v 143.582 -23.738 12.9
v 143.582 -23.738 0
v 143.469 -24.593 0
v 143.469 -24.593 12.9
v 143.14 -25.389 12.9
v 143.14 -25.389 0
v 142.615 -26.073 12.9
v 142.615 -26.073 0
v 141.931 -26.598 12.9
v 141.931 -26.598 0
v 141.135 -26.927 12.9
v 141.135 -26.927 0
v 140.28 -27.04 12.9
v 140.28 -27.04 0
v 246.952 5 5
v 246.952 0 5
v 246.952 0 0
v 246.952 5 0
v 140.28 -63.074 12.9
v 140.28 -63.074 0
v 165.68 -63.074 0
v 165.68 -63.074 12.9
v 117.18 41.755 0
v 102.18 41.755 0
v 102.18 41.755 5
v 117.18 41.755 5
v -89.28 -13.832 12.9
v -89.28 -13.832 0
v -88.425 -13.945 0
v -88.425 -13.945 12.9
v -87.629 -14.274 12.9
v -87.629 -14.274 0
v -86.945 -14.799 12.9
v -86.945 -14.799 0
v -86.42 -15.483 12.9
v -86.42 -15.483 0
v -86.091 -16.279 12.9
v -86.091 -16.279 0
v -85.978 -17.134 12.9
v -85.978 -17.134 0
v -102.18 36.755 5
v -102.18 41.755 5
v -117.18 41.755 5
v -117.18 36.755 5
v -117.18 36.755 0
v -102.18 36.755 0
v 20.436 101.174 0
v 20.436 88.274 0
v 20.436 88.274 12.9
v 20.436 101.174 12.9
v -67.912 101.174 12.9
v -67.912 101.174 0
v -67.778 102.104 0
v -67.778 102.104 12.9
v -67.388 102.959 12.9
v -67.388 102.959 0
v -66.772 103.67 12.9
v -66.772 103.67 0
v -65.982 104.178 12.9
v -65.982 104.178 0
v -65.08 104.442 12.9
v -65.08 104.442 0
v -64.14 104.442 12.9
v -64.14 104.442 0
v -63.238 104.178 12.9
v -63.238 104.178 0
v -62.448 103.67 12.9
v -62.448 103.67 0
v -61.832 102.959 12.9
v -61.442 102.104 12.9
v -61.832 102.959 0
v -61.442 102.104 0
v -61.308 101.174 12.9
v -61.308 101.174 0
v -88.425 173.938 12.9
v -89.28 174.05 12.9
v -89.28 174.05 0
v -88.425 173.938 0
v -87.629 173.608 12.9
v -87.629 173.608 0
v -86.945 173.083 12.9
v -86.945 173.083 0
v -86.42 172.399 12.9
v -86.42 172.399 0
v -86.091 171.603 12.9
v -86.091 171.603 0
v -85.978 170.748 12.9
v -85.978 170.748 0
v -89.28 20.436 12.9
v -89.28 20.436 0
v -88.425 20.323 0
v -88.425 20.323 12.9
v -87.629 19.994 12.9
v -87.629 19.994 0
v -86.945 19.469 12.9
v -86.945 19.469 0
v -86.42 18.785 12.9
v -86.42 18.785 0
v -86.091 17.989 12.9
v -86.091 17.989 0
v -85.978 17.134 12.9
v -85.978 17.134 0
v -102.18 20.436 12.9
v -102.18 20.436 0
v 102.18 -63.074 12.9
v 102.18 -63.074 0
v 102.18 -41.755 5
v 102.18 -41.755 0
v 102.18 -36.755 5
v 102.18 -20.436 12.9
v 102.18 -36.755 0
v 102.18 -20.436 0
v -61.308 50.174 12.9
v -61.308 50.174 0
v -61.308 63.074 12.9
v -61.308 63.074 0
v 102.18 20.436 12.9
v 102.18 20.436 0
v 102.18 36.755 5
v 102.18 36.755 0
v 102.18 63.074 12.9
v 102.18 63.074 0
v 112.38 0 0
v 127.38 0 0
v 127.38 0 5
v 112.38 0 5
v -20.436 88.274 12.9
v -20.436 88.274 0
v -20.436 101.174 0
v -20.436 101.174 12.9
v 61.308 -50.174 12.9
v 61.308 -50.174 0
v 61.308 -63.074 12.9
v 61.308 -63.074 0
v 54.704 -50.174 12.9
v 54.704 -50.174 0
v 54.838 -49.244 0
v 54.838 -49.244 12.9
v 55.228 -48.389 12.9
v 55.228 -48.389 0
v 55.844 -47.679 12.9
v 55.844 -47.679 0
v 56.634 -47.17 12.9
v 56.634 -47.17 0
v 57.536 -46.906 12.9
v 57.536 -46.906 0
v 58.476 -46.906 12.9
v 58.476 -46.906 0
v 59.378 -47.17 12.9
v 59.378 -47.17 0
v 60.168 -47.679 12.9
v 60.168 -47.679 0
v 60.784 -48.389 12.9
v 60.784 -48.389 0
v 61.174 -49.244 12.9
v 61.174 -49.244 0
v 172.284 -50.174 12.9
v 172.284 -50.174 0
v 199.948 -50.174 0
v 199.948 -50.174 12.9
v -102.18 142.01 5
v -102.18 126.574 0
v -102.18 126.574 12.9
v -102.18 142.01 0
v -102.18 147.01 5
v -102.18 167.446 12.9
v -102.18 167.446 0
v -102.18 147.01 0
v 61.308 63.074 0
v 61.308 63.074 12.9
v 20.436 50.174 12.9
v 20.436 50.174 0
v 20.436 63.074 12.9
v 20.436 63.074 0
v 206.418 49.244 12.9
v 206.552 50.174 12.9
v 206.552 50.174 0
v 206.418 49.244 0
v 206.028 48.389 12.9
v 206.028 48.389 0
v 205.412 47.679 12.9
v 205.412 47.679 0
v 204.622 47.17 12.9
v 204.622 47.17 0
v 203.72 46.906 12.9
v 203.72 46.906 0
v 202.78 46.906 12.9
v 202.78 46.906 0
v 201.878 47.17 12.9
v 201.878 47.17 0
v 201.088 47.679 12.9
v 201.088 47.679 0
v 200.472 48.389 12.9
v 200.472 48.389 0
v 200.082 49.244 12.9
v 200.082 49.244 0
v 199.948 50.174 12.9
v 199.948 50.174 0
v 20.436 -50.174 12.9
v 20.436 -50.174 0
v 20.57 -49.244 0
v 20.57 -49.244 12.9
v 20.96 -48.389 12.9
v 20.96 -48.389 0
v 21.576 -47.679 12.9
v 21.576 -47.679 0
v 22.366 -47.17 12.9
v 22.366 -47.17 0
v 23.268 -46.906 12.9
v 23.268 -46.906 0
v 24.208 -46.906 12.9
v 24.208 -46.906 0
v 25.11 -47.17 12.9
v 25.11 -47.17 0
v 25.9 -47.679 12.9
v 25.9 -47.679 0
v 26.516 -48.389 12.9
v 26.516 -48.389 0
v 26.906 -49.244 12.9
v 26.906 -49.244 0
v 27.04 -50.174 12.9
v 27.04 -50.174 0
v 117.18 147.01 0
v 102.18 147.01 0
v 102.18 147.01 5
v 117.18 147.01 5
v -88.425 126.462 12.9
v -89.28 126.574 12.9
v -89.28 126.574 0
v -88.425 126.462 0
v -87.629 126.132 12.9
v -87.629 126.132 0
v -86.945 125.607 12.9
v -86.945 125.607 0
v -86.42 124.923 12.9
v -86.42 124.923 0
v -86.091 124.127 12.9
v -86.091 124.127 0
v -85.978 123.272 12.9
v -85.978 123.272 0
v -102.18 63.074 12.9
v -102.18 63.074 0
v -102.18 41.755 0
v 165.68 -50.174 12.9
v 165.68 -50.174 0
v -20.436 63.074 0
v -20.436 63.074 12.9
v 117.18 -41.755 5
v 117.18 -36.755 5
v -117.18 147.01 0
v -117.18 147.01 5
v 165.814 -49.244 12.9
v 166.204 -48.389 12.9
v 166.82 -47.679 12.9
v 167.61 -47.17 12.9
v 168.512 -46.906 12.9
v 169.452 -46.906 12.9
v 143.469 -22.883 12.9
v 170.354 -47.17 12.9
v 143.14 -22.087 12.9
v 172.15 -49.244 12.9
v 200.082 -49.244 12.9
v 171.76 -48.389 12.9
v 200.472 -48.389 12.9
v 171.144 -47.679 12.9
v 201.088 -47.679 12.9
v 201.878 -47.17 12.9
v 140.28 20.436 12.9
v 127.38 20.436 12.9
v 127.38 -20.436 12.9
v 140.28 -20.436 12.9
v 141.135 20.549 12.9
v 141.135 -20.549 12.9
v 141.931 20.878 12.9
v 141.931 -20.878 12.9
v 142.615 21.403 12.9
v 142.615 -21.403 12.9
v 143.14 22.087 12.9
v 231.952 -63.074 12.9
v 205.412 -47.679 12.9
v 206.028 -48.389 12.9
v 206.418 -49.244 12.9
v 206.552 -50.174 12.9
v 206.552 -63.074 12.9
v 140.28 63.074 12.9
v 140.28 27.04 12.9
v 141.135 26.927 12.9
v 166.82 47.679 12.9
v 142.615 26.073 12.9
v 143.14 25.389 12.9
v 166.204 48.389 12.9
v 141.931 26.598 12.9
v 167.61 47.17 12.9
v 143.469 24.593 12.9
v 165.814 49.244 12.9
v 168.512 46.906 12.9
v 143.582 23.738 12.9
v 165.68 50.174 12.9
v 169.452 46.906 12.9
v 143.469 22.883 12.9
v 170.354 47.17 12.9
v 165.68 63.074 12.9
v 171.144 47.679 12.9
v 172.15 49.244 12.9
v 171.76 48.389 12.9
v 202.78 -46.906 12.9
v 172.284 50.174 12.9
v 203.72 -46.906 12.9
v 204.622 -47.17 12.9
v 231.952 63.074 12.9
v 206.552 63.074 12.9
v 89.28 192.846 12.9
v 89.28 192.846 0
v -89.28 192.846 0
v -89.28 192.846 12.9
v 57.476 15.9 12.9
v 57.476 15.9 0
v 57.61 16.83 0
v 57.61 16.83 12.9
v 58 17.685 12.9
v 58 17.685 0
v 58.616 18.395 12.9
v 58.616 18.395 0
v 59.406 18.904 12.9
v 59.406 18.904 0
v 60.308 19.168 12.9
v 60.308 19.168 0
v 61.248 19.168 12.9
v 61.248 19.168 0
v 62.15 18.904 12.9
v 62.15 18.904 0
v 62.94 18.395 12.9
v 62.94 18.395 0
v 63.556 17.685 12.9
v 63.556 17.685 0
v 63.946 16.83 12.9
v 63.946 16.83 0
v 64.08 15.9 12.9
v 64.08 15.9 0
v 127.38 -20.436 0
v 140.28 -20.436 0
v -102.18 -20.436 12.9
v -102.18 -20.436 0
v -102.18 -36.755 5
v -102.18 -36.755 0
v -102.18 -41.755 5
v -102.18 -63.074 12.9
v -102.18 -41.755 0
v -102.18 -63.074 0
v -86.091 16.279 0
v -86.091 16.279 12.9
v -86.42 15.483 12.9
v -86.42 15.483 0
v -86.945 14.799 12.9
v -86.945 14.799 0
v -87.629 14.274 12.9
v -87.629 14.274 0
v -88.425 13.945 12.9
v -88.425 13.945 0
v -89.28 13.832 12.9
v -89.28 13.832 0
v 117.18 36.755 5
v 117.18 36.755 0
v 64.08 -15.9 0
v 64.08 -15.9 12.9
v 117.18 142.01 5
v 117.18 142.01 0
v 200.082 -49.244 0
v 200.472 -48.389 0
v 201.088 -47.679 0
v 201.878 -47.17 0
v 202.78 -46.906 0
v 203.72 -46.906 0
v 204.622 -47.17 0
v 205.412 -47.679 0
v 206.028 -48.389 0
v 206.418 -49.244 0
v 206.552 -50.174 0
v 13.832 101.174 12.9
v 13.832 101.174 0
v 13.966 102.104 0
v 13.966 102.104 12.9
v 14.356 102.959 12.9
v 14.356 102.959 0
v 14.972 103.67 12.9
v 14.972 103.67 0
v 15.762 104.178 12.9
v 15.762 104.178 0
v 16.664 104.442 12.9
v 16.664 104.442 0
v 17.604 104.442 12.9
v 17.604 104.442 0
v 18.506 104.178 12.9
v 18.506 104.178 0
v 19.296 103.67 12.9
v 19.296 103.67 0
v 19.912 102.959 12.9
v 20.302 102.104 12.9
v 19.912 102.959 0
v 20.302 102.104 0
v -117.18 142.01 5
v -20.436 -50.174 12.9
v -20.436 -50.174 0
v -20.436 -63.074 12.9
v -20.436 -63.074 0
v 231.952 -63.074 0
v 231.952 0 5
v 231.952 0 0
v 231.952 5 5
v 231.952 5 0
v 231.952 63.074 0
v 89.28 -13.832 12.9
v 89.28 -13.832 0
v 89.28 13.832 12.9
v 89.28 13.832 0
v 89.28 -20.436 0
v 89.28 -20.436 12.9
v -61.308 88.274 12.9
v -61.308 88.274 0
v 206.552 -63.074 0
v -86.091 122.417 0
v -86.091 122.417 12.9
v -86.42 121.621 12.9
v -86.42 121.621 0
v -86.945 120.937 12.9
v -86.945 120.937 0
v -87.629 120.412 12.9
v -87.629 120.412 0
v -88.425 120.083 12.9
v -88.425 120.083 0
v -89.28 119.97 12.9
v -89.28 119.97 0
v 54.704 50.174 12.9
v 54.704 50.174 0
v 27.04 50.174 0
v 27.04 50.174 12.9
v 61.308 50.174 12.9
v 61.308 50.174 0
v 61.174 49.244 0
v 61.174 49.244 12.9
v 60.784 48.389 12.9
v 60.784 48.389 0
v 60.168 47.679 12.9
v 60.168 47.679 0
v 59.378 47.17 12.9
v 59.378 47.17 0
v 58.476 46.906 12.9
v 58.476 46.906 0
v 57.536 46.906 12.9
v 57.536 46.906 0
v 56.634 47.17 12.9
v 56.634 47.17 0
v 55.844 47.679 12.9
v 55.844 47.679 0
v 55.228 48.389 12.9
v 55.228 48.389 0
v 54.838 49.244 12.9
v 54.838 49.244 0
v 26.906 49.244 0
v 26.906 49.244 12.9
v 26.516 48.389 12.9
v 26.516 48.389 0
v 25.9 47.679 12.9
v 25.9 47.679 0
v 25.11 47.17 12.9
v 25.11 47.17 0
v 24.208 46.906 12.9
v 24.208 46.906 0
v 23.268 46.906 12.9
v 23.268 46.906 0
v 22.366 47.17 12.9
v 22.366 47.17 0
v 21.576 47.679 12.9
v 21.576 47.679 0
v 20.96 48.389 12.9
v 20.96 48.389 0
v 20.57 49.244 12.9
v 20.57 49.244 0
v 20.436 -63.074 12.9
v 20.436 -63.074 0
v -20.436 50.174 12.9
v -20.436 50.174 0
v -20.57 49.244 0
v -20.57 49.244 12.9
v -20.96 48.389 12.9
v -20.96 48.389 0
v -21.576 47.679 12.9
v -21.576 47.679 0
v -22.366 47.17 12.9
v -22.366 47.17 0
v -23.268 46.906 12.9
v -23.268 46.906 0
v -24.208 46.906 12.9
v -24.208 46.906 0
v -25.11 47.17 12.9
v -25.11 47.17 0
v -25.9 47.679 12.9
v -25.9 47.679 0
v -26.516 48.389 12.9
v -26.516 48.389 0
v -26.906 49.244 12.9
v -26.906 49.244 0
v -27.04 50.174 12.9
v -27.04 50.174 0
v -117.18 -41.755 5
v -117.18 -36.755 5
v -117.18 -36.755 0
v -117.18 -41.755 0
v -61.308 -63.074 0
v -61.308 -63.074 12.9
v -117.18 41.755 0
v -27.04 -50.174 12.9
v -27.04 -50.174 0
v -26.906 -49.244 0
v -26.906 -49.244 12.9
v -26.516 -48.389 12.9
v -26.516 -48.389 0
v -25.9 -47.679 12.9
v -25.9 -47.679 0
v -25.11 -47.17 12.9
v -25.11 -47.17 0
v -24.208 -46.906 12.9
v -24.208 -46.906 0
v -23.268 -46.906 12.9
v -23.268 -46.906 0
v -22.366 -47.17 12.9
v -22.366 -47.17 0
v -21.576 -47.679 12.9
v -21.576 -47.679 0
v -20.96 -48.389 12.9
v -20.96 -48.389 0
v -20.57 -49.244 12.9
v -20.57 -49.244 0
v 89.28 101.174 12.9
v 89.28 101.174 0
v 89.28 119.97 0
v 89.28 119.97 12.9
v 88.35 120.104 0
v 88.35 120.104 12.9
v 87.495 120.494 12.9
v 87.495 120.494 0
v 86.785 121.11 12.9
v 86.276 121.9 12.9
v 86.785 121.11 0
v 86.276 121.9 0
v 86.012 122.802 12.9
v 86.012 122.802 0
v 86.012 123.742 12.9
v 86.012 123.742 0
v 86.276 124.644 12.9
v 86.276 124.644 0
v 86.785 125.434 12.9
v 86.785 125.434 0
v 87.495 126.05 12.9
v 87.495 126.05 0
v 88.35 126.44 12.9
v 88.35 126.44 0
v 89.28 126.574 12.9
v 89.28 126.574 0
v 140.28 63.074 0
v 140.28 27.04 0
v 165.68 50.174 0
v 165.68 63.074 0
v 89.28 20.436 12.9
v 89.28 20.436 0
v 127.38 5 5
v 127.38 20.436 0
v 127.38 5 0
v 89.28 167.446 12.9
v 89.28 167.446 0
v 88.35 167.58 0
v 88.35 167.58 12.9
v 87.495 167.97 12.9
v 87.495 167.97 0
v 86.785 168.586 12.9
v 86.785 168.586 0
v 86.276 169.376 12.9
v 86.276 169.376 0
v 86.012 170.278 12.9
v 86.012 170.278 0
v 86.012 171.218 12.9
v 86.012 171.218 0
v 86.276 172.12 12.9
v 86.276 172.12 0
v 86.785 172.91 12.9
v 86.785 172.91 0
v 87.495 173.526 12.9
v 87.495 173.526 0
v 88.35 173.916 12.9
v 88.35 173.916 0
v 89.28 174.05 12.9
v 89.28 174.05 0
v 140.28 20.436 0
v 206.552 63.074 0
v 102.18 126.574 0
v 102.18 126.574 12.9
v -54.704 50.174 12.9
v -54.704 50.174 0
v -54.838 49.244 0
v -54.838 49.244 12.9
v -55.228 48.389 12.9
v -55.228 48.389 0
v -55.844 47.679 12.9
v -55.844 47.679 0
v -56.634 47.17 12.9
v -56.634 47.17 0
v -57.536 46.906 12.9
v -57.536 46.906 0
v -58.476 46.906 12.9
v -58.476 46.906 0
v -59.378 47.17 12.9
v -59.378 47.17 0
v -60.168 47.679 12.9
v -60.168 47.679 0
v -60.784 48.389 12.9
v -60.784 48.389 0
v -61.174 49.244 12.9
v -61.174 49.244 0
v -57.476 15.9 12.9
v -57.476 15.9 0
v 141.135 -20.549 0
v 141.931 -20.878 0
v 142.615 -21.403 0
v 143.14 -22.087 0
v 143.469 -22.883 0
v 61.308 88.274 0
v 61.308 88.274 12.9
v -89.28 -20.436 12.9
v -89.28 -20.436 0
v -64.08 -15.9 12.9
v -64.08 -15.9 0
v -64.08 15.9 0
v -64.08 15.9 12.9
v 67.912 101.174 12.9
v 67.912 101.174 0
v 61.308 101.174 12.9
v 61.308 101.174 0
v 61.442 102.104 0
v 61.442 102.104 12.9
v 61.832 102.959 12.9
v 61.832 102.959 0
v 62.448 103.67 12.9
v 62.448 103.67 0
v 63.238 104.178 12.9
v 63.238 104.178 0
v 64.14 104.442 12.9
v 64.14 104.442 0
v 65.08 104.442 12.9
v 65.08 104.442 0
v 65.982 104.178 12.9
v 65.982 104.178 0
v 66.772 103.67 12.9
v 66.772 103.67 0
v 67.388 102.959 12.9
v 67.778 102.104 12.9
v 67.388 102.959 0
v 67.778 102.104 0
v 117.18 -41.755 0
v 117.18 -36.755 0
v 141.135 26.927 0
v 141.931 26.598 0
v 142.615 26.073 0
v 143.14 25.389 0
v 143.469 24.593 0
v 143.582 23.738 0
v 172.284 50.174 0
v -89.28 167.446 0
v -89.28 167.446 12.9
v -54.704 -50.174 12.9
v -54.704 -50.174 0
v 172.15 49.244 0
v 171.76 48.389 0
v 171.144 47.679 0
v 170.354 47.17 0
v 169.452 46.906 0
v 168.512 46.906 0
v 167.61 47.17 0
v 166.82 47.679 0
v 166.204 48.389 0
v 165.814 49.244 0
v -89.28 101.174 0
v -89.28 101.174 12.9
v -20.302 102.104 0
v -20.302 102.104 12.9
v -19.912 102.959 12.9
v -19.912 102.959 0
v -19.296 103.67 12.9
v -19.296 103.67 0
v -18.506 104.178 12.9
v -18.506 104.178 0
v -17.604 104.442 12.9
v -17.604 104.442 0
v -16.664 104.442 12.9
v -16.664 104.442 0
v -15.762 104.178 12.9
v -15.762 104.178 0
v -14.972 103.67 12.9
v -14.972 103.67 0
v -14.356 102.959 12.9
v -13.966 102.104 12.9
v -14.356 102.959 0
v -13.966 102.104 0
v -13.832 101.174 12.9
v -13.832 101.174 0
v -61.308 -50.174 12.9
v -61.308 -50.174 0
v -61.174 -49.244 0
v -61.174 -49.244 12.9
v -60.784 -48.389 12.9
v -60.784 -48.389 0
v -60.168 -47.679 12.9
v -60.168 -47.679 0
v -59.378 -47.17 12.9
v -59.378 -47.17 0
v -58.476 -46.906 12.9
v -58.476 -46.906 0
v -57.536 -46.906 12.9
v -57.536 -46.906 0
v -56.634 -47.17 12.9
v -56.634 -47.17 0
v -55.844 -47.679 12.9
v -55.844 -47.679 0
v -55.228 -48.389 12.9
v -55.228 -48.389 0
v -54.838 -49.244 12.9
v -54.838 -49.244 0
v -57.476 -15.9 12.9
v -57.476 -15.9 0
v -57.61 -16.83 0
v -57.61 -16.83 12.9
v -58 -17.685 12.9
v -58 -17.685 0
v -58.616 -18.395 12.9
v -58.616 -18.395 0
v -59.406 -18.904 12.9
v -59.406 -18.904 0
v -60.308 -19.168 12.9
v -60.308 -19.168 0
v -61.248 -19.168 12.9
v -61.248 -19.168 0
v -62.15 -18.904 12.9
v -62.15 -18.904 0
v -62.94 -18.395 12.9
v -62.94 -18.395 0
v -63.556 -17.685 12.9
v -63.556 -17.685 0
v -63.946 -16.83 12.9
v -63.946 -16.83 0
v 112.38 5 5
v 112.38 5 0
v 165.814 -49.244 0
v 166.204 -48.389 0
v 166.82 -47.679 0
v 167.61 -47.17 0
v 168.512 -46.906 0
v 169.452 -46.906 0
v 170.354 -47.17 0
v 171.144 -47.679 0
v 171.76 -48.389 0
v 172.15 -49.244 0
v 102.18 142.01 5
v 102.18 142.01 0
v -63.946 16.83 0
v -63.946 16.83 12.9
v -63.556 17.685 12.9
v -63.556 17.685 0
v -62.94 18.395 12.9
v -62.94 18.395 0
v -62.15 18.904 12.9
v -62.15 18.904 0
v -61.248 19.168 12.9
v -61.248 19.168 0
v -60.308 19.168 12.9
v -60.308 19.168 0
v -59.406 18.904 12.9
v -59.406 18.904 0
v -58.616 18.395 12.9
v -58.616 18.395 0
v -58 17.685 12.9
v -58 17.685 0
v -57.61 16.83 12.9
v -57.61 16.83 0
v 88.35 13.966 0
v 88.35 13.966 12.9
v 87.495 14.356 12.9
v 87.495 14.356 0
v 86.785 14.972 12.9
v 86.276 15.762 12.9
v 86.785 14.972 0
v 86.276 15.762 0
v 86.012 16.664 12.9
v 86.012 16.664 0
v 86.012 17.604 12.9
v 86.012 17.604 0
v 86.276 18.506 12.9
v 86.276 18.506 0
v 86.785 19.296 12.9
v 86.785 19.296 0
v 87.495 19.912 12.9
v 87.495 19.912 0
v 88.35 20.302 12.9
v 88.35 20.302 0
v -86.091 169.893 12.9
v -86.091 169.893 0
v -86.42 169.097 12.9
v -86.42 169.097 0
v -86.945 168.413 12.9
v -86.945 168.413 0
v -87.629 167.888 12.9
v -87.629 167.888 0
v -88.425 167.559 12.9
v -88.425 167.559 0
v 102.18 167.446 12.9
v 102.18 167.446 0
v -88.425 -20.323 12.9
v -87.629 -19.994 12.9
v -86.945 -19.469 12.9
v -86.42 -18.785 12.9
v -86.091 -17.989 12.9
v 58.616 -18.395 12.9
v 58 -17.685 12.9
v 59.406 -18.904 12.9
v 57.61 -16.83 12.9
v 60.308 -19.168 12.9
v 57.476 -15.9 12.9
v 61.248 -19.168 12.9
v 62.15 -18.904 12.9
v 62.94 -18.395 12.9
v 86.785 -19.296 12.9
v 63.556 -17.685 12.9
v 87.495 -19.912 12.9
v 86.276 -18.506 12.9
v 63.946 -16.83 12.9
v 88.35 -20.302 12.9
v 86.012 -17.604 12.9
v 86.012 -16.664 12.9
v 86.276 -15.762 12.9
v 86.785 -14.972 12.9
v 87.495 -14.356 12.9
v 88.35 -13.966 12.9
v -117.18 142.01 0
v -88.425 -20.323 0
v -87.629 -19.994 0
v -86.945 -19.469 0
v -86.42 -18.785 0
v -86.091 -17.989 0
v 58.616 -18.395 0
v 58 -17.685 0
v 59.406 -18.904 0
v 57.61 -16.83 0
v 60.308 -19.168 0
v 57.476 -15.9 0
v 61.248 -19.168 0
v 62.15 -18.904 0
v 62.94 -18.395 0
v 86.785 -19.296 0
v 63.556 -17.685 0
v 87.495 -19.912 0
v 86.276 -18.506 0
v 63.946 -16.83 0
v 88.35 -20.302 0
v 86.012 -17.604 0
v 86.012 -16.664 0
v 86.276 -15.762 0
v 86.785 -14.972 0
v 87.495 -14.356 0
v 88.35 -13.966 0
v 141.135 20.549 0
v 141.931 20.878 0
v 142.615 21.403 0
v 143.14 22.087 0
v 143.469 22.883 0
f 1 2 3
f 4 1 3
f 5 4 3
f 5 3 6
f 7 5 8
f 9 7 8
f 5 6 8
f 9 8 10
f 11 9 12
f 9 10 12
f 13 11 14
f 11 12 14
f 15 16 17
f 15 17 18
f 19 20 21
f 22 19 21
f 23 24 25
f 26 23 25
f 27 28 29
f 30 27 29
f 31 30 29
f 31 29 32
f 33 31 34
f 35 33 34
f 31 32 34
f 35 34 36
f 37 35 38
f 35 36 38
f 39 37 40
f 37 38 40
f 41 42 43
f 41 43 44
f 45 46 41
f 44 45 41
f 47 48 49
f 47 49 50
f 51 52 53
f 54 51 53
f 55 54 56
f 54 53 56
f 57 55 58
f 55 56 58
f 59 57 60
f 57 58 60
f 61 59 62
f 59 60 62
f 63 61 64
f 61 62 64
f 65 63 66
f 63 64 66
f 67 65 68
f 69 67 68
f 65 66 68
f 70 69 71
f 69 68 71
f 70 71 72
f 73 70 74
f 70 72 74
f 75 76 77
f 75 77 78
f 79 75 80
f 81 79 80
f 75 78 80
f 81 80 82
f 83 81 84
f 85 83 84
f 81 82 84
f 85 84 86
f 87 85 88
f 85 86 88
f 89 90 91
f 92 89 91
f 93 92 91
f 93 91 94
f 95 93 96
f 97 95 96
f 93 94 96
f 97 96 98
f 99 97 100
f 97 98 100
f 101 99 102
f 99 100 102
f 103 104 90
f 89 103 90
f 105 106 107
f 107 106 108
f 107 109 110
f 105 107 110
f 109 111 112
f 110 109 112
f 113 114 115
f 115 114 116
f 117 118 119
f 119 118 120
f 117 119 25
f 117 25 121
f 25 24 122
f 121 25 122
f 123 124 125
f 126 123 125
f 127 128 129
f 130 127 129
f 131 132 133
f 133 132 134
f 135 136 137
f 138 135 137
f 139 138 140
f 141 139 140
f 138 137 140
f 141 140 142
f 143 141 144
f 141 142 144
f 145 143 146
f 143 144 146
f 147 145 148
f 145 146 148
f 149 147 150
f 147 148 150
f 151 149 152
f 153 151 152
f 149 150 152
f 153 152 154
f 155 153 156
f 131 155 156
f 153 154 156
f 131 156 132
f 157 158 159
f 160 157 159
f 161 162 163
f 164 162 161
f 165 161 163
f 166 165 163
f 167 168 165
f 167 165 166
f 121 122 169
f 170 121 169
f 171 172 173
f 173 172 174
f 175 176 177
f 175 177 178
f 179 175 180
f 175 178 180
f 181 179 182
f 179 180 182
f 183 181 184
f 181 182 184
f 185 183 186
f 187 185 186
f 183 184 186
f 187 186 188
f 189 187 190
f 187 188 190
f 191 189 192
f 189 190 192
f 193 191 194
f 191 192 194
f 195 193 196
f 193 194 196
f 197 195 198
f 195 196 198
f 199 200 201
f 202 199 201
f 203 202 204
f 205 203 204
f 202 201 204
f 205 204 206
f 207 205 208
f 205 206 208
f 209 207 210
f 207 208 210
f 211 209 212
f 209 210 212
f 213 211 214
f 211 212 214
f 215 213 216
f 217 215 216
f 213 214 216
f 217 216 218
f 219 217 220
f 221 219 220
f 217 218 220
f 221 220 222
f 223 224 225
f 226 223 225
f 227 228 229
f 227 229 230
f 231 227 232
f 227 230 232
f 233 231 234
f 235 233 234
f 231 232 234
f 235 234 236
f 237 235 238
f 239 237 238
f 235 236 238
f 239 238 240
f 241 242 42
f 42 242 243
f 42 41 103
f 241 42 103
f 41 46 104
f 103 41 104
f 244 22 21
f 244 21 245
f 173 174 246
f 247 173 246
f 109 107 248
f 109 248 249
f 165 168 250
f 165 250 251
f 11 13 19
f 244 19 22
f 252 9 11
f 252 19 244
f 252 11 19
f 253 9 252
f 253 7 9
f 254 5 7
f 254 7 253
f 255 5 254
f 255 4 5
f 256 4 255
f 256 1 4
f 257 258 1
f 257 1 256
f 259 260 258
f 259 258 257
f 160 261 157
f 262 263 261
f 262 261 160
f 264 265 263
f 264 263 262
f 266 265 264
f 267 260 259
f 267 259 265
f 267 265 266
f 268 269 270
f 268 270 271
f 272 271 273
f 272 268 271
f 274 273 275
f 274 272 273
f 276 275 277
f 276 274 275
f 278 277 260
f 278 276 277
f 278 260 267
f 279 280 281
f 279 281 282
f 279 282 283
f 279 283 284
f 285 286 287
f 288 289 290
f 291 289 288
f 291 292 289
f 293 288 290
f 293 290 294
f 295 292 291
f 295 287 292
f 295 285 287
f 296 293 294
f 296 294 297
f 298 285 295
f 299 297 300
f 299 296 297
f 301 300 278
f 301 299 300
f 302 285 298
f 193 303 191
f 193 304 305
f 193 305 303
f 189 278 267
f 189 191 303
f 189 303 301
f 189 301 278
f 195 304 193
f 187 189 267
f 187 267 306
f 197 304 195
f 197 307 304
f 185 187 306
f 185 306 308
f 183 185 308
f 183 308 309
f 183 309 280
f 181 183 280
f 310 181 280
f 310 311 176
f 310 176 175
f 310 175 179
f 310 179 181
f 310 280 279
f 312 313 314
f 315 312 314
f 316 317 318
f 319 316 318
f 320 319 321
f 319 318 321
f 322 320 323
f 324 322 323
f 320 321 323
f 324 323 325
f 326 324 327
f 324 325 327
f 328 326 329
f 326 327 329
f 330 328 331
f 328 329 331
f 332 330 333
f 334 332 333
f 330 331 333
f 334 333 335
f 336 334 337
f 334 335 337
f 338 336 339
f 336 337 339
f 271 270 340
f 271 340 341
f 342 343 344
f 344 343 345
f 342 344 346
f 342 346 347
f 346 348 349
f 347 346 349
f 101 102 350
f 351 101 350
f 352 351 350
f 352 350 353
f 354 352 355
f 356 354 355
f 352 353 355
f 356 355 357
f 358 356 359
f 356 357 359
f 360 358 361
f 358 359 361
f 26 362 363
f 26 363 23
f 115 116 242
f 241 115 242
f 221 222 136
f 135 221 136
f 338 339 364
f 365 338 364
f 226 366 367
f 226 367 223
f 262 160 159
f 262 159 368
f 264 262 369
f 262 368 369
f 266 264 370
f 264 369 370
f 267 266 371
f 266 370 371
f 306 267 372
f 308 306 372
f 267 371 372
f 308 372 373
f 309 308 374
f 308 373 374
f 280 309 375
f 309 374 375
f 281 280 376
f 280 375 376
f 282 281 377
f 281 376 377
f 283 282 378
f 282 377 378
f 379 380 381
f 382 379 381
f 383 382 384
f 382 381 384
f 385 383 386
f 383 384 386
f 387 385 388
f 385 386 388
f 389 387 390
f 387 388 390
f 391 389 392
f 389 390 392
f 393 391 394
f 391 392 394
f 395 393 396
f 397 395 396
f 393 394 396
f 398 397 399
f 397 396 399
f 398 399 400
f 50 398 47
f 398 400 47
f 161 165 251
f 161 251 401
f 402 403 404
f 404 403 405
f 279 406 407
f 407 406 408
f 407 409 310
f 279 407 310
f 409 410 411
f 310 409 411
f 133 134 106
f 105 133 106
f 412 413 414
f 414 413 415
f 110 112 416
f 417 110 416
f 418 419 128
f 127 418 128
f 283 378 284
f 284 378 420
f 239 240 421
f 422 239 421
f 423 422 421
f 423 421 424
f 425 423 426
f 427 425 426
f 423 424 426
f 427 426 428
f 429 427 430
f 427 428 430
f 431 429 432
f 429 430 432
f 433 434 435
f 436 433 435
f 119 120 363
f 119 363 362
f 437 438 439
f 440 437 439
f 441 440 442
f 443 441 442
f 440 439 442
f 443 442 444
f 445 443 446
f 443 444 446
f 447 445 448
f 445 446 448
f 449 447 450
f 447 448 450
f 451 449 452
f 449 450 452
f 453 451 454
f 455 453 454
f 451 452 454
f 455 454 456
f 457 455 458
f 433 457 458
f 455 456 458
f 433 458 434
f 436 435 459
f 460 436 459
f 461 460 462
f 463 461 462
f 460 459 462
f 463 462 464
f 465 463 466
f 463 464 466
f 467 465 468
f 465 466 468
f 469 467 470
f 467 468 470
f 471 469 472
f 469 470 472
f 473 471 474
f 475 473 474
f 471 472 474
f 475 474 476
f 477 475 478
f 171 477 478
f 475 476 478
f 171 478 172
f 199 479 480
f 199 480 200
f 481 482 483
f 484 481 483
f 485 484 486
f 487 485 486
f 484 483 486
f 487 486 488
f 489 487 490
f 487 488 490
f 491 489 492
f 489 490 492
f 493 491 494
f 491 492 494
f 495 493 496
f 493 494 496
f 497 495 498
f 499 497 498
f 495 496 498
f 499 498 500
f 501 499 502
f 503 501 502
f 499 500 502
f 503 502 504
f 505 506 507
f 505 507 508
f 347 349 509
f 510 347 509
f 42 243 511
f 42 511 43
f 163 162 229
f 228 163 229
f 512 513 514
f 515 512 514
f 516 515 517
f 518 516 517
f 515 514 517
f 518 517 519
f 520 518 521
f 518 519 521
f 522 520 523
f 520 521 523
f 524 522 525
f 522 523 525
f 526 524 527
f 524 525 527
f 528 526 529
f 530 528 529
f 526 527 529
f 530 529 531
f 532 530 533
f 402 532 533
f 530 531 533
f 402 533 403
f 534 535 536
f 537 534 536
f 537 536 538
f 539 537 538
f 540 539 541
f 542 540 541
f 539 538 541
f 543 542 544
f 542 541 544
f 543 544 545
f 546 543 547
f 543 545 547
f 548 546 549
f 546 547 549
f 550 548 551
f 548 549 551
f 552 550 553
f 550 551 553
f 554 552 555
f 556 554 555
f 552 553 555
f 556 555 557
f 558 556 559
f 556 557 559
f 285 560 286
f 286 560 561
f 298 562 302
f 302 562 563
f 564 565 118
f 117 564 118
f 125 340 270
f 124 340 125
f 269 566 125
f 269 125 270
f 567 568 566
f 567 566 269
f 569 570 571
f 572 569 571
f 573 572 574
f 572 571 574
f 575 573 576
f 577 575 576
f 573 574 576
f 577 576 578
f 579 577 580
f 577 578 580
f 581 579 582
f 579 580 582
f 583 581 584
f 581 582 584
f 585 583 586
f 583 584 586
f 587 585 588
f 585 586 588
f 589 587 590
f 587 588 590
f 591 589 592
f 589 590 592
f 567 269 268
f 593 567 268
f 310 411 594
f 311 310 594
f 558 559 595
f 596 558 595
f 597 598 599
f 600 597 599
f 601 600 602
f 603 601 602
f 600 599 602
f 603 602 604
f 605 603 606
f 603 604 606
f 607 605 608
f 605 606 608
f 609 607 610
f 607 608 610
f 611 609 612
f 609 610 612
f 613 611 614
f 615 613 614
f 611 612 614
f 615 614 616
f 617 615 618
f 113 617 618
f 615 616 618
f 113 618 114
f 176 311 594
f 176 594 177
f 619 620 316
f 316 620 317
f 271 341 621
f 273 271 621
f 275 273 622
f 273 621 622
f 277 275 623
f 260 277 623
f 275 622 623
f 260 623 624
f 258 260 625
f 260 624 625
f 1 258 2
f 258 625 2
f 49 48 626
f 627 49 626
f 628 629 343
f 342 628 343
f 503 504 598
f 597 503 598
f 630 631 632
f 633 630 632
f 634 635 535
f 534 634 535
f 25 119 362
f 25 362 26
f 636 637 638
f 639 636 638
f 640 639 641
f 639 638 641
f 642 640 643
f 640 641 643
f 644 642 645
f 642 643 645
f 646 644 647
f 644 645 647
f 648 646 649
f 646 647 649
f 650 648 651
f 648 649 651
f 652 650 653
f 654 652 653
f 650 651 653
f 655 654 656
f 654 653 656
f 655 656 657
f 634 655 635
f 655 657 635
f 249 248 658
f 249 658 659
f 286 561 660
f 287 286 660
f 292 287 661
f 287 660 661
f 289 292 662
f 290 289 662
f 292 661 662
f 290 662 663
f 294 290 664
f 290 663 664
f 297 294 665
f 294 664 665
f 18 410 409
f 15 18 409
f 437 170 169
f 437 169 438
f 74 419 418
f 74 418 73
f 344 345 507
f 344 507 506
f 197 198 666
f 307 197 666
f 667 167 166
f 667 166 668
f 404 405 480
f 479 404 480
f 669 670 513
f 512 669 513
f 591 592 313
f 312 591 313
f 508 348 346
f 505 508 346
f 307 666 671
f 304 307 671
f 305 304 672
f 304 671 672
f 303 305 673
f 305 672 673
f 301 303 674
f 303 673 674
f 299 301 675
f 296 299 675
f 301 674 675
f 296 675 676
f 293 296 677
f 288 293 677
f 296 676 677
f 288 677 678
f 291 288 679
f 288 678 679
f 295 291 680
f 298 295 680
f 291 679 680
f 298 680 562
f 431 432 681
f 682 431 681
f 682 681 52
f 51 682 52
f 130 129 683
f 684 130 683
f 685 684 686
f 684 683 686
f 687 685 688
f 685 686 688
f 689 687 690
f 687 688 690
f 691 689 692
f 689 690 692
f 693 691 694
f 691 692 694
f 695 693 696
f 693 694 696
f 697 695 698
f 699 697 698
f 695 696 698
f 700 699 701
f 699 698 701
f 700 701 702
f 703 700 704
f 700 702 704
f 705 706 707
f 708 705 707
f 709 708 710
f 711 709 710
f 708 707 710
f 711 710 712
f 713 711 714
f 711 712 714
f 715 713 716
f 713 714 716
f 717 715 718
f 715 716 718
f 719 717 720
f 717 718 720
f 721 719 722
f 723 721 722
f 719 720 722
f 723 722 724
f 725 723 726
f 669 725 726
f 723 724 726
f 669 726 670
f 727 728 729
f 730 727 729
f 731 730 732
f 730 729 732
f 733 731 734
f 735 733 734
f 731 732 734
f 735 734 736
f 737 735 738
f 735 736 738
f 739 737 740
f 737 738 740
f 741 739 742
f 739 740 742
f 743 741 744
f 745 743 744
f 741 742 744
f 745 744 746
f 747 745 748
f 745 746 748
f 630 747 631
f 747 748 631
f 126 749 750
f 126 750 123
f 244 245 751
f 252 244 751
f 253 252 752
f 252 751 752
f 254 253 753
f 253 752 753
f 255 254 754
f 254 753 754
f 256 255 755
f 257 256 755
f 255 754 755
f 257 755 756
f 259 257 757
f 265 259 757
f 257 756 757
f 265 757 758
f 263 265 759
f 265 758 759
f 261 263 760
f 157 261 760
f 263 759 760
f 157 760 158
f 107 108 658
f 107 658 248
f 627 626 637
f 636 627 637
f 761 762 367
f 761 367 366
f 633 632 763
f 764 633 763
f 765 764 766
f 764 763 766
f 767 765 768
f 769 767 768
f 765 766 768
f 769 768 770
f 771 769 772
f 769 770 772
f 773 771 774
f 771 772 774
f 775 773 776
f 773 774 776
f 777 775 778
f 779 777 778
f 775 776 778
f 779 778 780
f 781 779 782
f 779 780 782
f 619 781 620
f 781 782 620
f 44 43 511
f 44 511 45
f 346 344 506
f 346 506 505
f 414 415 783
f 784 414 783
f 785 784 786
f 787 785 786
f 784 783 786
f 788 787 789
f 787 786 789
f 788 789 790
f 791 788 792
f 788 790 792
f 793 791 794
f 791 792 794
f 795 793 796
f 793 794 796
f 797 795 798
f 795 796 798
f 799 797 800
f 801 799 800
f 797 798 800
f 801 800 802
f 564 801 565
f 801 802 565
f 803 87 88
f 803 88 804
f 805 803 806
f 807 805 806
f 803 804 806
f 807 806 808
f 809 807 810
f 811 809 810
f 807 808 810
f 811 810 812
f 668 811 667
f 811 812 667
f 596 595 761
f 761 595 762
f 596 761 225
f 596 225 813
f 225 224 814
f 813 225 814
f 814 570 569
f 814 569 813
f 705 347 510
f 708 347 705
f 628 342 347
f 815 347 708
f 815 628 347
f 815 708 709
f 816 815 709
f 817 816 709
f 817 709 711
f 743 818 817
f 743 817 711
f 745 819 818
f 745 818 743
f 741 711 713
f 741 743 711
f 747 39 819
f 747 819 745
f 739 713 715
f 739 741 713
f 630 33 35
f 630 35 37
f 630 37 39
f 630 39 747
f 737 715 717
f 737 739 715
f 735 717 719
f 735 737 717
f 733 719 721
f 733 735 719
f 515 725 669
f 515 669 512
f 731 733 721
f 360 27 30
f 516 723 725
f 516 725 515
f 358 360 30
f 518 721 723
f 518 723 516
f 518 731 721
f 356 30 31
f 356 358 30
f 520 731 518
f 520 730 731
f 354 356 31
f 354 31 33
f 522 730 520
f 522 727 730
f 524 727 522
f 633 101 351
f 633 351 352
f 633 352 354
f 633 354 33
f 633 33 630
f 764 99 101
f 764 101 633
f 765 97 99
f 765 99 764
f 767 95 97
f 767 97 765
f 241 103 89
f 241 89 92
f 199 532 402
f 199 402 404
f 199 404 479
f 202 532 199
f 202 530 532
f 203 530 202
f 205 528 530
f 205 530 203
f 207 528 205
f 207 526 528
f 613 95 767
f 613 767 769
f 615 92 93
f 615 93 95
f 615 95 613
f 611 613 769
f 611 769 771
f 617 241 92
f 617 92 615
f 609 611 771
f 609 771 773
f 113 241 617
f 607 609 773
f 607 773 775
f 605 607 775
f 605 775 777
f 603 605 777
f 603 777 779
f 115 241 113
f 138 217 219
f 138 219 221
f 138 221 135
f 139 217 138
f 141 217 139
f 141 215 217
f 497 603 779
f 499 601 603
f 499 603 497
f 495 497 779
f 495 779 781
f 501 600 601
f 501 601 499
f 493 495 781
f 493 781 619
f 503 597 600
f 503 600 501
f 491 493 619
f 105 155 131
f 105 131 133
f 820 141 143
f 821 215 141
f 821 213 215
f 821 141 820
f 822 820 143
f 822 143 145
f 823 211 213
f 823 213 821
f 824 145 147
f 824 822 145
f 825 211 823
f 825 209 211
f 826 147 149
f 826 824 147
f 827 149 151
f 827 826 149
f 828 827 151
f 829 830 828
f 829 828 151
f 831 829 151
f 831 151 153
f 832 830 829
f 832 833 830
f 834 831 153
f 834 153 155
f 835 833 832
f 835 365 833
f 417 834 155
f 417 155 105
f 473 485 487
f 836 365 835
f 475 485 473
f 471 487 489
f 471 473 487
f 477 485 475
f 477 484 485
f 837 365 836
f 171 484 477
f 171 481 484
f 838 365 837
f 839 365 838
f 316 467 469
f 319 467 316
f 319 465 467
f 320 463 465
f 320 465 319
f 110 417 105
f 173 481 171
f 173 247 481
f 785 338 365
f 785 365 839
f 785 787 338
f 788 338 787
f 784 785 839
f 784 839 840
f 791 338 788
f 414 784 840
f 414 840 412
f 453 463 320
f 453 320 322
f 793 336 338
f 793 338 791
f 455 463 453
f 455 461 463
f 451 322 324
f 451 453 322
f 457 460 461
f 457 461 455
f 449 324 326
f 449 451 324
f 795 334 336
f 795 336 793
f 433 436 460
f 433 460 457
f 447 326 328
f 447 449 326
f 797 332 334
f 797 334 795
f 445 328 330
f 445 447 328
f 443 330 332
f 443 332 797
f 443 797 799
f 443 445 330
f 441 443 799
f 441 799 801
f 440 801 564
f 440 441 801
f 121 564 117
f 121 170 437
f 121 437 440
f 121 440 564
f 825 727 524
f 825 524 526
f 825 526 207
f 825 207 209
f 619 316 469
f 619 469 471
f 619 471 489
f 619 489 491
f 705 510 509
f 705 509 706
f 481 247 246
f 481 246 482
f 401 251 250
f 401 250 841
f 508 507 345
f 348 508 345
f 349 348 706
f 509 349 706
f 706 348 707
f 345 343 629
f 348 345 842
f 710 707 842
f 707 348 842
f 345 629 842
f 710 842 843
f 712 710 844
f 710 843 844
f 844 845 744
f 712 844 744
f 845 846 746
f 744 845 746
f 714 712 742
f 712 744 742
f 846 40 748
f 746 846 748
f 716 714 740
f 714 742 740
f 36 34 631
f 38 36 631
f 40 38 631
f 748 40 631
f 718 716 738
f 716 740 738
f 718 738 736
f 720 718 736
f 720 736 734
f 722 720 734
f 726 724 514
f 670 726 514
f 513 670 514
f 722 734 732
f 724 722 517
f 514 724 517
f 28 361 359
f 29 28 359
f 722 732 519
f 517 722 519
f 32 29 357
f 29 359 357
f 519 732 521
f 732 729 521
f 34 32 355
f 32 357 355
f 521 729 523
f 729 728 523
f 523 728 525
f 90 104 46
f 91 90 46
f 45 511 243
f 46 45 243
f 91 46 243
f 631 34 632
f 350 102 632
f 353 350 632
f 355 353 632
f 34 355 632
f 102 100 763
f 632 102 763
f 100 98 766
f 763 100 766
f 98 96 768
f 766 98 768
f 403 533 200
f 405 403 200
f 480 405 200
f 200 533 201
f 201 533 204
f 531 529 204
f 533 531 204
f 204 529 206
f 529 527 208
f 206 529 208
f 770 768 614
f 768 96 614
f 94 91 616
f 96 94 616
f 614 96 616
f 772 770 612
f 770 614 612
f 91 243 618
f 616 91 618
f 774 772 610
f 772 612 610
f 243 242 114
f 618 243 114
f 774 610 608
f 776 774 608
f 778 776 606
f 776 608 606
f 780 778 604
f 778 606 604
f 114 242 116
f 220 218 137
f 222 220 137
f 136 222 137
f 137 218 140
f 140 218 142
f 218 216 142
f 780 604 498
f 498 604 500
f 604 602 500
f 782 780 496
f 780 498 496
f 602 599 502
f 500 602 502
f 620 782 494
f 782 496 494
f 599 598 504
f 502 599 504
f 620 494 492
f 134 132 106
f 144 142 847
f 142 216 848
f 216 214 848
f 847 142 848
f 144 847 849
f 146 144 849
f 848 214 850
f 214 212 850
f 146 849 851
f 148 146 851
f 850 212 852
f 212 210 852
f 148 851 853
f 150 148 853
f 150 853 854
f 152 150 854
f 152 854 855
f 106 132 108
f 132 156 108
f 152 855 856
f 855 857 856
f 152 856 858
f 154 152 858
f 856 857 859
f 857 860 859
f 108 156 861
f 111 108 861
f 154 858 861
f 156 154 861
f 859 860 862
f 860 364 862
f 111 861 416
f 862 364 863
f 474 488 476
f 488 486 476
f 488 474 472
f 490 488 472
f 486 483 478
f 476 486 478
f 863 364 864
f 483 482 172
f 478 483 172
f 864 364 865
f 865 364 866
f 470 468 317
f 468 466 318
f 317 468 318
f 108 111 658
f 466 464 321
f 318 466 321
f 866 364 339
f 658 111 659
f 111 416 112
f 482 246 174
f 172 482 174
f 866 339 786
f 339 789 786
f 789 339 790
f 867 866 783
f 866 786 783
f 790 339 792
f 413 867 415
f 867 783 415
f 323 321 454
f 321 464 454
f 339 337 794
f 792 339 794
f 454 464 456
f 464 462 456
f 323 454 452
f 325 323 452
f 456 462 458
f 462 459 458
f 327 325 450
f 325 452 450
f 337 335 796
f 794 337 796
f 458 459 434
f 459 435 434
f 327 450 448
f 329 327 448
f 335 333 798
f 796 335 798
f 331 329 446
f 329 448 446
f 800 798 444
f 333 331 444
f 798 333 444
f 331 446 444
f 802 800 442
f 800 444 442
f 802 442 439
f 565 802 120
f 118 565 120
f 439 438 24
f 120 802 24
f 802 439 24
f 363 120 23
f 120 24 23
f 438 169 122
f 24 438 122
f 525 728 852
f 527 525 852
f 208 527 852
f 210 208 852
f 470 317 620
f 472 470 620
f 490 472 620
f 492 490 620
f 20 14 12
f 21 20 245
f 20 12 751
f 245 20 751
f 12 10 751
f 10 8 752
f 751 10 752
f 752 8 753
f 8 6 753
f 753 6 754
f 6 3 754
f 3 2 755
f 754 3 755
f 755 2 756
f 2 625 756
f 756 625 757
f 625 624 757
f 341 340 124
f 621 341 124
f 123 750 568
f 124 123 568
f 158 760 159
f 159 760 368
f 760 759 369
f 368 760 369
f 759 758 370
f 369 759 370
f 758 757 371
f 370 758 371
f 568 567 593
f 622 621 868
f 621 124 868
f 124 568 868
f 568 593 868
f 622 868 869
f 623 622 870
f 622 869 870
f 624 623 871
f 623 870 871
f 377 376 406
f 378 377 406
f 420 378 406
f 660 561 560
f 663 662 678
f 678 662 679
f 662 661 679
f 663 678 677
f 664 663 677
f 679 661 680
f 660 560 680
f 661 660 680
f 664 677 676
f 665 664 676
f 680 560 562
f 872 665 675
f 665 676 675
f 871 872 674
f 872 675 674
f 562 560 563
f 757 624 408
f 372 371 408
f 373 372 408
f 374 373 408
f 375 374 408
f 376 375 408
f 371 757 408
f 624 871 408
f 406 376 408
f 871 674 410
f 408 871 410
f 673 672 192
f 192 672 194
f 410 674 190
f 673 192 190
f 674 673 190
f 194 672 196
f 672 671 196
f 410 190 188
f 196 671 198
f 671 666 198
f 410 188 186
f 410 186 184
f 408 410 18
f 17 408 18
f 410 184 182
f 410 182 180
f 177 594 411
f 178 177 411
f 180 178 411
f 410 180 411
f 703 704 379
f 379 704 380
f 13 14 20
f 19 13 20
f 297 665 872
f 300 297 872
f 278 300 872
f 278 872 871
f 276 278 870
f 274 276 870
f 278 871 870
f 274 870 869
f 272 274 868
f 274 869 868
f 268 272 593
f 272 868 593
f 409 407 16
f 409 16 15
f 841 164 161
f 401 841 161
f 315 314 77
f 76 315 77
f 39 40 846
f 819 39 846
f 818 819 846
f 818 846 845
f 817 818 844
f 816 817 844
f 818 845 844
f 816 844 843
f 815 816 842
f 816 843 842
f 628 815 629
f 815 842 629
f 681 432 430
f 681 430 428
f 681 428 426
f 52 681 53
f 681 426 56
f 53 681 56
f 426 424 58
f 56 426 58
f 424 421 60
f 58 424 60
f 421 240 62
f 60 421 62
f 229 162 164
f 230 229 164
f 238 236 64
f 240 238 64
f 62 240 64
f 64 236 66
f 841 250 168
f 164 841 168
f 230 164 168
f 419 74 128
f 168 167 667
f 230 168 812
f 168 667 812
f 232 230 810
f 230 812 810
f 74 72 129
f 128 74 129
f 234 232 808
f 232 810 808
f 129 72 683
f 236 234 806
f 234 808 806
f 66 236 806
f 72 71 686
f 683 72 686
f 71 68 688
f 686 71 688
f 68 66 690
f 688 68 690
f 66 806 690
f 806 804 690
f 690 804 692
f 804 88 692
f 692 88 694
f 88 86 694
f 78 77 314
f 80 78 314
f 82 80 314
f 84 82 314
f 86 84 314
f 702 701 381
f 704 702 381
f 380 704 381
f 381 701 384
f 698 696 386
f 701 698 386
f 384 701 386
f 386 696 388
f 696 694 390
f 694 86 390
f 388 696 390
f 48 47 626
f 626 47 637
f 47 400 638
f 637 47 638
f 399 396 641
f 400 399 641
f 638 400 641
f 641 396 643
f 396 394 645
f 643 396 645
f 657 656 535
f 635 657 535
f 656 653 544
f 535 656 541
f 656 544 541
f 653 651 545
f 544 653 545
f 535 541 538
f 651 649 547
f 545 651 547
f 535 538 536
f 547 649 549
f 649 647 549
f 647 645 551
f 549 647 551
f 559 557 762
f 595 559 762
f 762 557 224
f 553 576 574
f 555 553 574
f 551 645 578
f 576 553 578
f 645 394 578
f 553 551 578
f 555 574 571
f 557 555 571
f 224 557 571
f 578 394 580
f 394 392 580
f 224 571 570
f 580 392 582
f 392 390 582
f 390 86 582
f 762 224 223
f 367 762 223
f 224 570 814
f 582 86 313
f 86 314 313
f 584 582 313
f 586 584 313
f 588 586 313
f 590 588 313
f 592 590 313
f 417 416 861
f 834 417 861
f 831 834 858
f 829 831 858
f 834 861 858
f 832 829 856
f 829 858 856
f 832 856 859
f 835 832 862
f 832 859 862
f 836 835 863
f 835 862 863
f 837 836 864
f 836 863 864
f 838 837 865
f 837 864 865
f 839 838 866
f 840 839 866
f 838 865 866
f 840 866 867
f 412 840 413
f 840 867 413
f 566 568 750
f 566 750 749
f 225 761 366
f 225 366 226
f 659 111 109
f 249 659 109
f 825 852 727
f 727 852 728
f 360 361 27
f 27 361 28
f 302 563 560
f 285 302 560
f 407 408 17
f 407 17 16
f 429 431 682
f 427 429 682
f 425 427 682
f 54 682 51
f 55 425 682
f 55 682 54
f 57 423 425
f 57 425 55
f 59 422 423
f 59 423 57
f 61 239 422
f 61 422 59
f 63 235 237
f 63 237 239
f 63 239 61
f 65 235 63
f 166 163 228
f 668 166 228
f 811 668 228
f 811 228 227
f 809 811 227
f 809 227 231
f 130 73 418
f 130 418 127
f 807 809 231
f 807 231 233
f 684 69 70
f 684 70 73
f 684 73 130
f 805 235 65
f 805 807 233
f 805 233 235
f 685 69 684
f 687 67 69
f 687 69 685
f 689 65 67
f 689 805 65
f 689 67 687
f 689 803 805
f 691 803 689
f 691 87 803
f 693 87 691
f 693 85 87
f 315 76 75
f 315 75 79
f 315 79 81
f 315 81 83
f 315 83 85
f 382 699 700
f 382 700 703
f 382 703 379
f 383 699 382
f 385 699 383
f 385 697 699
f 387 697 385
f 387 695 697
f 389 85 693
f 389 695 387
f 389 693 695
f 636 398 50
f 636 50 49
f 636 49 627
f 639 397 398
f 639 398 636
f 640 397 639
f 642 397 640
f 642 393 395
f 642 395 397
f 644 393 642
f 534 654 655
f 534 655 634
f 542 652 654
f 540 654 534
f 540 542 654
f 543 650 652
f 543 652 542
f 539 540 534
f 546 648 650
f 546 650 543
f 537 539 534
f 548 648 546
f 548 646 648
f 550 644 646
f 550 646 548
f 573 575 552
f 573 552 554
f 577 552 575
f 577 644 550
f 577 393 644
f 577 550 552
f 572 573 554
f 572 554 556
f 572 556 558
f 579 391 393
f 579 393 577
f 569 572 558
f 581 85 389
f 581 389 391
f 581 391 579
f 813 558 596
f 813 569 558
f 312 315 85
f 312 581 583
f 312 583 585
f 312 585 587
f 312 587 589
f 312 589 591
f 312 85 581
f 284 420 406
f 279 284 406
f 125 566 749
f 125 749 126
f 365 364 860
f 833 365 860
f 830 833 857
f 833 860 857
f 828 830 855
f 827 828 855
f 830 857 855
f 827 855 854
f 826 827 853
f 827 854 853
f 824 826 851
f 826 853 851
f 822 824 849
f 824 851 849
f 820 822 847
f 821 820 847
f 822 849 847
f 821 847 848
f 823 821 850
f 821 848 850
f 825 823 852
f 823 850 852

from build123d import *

# Parameters (mm, degrees)
F2_DEPTH  = 12.9
F1_W      = 12.9
F1_H      = 40.872
F1_W_2    = 40.872
F1_H_2    = 12.9
F3_DEPTH  = 12.9
F4_DEPTH  = 12.9
F5_W      = 5
F5_H      = 5
F6_DEPTH  = 15
F7_W      = 5
F7_H      = 5
F8_DEPTH  = 15
F9_W      = 5
F9_H      = 5
F10_DEPTH = 15
F11_W     = 5
F11_H     = 5
F12_DEPTH = 15
F13_W     = 5
F13_H     = 5
F14_DEPTH = 15
F15_W     = 5
F15_H     = 5
F16_DEPTH = 15
F17_W     = 5
F17_H     = 5
F18_DEPTH = 15
F19_W     = 5
F19_H     = 5
F20_DEPTH = 15


with BuildPart() as f2:
    # F1 (on Top) → F2 (new body)
    with BuildSketch(Plane.XY):
        with BuildLine():
            Line((-61.308, 63.0740740741), (-102.18, 63.0740740741))
            Line((-102.18, 63.0740740741), (-102.18, 20.436))
            Line((-102.18, 20.436), (-89.28, 20.436))
            ThreePointArc((-89.28, 20.436), (-86.9451334085, 19.4688665915), (-85.978, 17.134))
            ThreePointArc((-85.978, 17.134), (-86.9451334085, 14.7991334085), (-89.28, 13.832))
            Line((-89.28, 13.832), (-89.28, -13.832))
            ThreePointArc((-89.28, -13.832), (-86.9451334085, -14.7991334085), (-85.978, -17.134))
            ThreePointArc((-85.978, -17.134), (-86.9451334085, -19.4688665915), (-89.28, -20.436))
            Line((-89.28, -20.436), (-102.18, -20.436))
            Line((-102.18, -20.436), (-102.18, -63.0740740741))
            Line((-102.18, -63.0740740741), (-61.308, -63.0740740741))
            Line((-61.308, -63.0740740741), (-61.308, -50.1740740741))
            ThreePointArc((-61.308, -50.1740740741), (-58.006, -46.8720740741), (-54.704, -50.1740740741))
            Line((-54.704, -50.1740740741), (-27.04, -50.1740740741))
            ThreePointArc((-27.04, -50.1740740741), (-23.738, -46.8720740741), (-20.436, -50.1740740741))
            Line((-20.436, -50.1740740741), (-20.436, -63.0740740741))
            Line((-20.436, -63.0740740741), (20.436, -63.0740740741))
            Line((20.436, -63.0740740741), (20.436, -50.1740740741))
            ThreePointArc((20.436, -50.1740740741), (23.738, -46.8720740741), (27.04, -50.1740740741))
            Line((27.04, -50.1740740741), (54.704, -50.1740740741))
            ThreePointArc((54.704, -50.1740740741), (58.006, -46.8720740741), (61.308, -50.1740740741))
            Line((61.308, -50.1740740741), (61.308, -63.0740740741))
            Line((61.308, -63.0740740741), (102.18, -63.0740740741))
            Line((102.18, -63.0740740741), (102.18, -20.436))
            Line((102.18, -20.436), (89.28, -20.436))
            ThreePointArc((89.28, -20.436), (85.978, -17.134), (89.28, -13.832))
            Line((89.28, -13.832), (89.28, 13.832))
            ThreePointArc((89.28, 13.832), (85.978, 17.134), (89.28, 20.436))
            Line((89.28, 20.436), (102.18, 20.436))
            Line((102.18, 20.436), (102.18, 63.0740740741))
            Line((102.18, 63.0740740741), (61.308, 63.0740740741))
            Line((61.308, 63.0740740741), (61.308, 50.1740740741))
            ThreePointArc((61.308, 50.1740740741), (58.006, 46.8720740741), (54.704, 50.1740740741))
            Line((54.704, 50.1740740741), (27.04, 50.1740740741))
            ThreePointArc((27.04, 50.1740740741), (23.738, 46.8720740741), (20.436, 50.1740740741))
            Line((20.436, 50.1740740741), (20.436, 63.0740740741))
            Line((20.436, 63.0740740741), (-20.436, 63.0740740741))
            Line((-20.436, 63.0740740741), (-20.436, 50.1740740741))
            ThreePointArc((-20.436, 50.1740740741), (-23.738, 46.8720740741), (-27.04, 50.1740740741))
            Line((-27.04, 50.1740740741), (-54.704, 50.1740740741))
            ThreePointArc((-54.704, 50.1740740741), (-58.006, 46.8720740741), (-61.308, 50.1740740741))
            Line((-61.308, 50.1740740741), (-61.308, 63.0740740741))
        make_face()
        with BuildLine():
            Line((57.476, -15.9), (-57.476, -15.9))
            ThreePointArc((-57.476, -15.9), (-60.778, -19.202), (-64.08, -15.9))
            Line((-64.08, -15.9), (-64.08, 15.9))
            ThreePointArc((-64.08, 15.9), (-60.778, 19.202), (-57.476, 15.9))
            Line((-57.476, 15.9), (57.476, 15.9))
            ThreePointArc((57.476, 15.9), (60.778, 19.202), (64.08, 15.9))
            Line((64.08, 15.9), (64.08, -15.9))
            ThreePointArc((64.08, -15.9), (60.778, -19.202), (57.476, -15.9))
        make_face(mode=Mode.SUBTRACT)
    extrude(amount=F2_DEPTH)

    # F5 (on face) → F6 (join)
    with BuildSketch(Plane(origin=(-102.18, 0, 0), x_dir=(0, -1, 0), z_dir=(-1, 0, 0))):
        with Locations((-39.255037037, 2.5)):
            Rectangle(F5_W, F5_H)
    extrude(amount=F6_DEPTH)

    # F7 (on face) → F8 (join)
    with BuildSketch(Plane(origin=(-102.18, 0, 0), x_dir=(0, -1, 0), z_dir=(-1, 0, 0))):
        with Locations((39.255037037, 2.5)):
            Rectangle(F7_W, F7_H)
    extrude(amount=F8_DEPTH)

    # F9 (on face) → F10 (join)
    with BuildSketch(Plane.YZ.offset(102.18)):
        with Locations((-39.255037037, 2.5)):
            Rectangle(F9_W, F9_H)
    extrude(amount=F10_DEPTH)

    # F11 (on face) → F12 (join)
    with BuildSketch(Plane.YZ.offset(102.18)):
        with Locations((39.255037037, 2.5)):
            Rectangle(F11_W, F11_H)
    extrude(amount=F12_DEPTH)


with BuildPart() as f3:
    # F1 (on Top) → F3 (new body)
    with BuildSketch(Plane.XY):
        with BuildLine():
            ThreePointArc((-67.912, 101.1740740741), (-64.61, 104.4760740741), (-61.308, 101.1740740741))
            Line((-61.308, 101.1740740741), (-20.436, 101.1740740741))
            ThreePointArc((-20.436, 101.1740740741), (-17.134, 104.4760740741), (-13.832, 101.1740740741))
            Line((-13.832, 101.1740740741), (13.832, 101.1740740741))
            ThreePointArc((13.832, 101.1740740741), (17.134, 104.4760740741), (20.436, 101.1740740741))
            Line((20.436, 101.1740740741), (61.308, 101.1740740741))
            ThreePointArc((61.308, 101.1740740741), (64.61, 104.4760740741), (67.912, 101.1740740741))
            Line((67.912, 101.1740740741), (89.28, 101.1740740741))
            Line((89.28, 101.1740740741), (89.28, 119.9700740741))
            ThreePointArc((89.28, 119.9700740741), (85.978, 123.2720740741), (89.28, 126.5740740741))
            Line((89.28, 126.5740740741), (89.28, 167.4460740741))
            ThreePointArc((89.28, 167.4460740741), (85.978, 170.7480740741), (89.28, 174.0500740741))
            Line((89.28, 174.0500740741), (89.28, 192.8460740741))
            Line((89.28, 192.8460740741), (-89.28, 192.8460740741))
            Line((-89.28, 192.8460740741), (-89.28, 174.0500740741))
            ThreePointArc((-89.28, 174.0500740741), (-86.9451334085, 173.0829406656), (-85.978, 170.7480740741))
            ThreePointArc((-85.978, 170.7480740741), (-86.9451334085, 168.4132074826), (-89.28, 167.4460740741))
            Line((-89.28, 167.4460740741), (-89.28, 126.5740740741))
            ThreePointArc((-89.28, 126.5740740741), (-86.9451334085, 125.6069406656), (-85.978, 123.2720740741))
            ThreePointArc((-85.978, 123.2720740741), (-86.9451334085, 120.9372074826), (-89.28, 119.9700740741))
            Line((-89.28, 119.9700740741), (-89.28, 101.1740740741))
            Line((-89.28, 101.1740740741), (-67.912, 101.1740740741))
        make_face()
        with Locations((-95.73, 147.0100740741)):
            Rectangle(F1_W, F1_H)
        with Locations((-40.872, 94.7240740741)):
            Rectangle(F1_W_2, F1_H_2)
        with Locations((40.872, 94.7240740741)):
            Rectangle(F1_W_2, F1_H_2)
        with Locations((95.73, 147.0100740741)):
            Rectangle(F1_W, F1_H)
    extrude(amount=F3_DEPTH)

    # F13 (on face) → F14 (join)
    with BuildSketch(Plane(origin=(-102.18, 0, 0), x_dir=(0, -1, 0), z_dir=(-1, 0, 0))):
        with Locations((-144.5100740741, 2.5)):
            Rectangle(F13_W, F13_H)
    extrude(amount=F14_DEPTH)

    # F15 (on face) → F16 (join)
    with BuildSketch(Plane.YZ.offset(102.18)):
        with Locations((144.5100740741, 2.5)):
            Rectangle(F15_W, F15_H)
    extrude(amount=F16_DEPTH)


with BuildPart() as f4:
    # F1 (on Top) → F4 (new body)
    with BuildSketch(Plane.XY):
        with BuildLine():
            ThreePointArc((143.582, 23.738), (142.6148665915, 21.4031334085), (140.28, 20.436))
            Line((140.28, 20.436), (140.28, -20.436))
            ThreePointArc((140.28, -20.436), (142.6148665915, -21.4031334085), (143.582, -23.738))
            ThreePointArc((143.582, -23.738), (142.6148665915, -26.0728665915), (140.28, -27.04))
            Line((140.28, -27.04), (140.28, -63.0740740741))
            Line((140.28, -63.0740740741), (165.68, -63.0740740741))
            Line((165.68, -63.0740740741), (165.68, -50.1740740741))
            ThreePointArc((165.68, -50.1740740741), (168.982, -46.8720740741), (172.284, -50.1740740741))
            Line((172.284, -50.1740740741), (199.948, -50.1740740741))
            ThreePointArc((199.948, -50.1740740741), (203.25, -46.8720740741), (206.552, -50.1740740741))
            Line((206.552, -50.1740740741), (206.552, -63.0740740741))
            Line((206.552, -63.0740740741), (231.952, -63.0740740741))
            Line((231.952, -63.0740740741), (231.952, 63.0740740741))
            Line((231.952, 63.0740740741), (206.552, 63.0740740741))
            Line((206.552, 63.0740740741), (206.552, 50.1740740741))
            ThreePointArc((206.552, 50.1740740741), (203.25, 46.8720740741), (199.948, 50.1740740741))
            Line((199.948, 50.1740740741), (172.284, 50.1740740741))
            ThreePointArc((172.284, 50.1740740741), (168.982, 46.8720740741), (165.68, 50.1740740741))
            Line((165.68, 50.1740740741), (165.68, 63.0740740741))
            Line((165.68, 63.0740740741), (140.28, 63.0740740741))
            Line((140.28, 63.0740740741), (140.28, 27.04))
            ThreePointArc((140.28, 27.04), (142.6148665915, 26.0728665915), (143.582, 23.738))
        make_face()
        with Locations((133.83, 0)):
            Rectangle(F1_W, F1_H)
    extrude(amount=F4_DEPTH)

    # F17 (on face) → F18 (join)
    with BuildSketch(Plane(origin=(127.38, 0, 0), x_dir=(0, -1, 0), z_dir=(-1, 0, 0))):
        with Locations((-2.5, 2.5)):
            Rectangle(F17_W, F17_H)
    extrude(amount=F18_DEPTH)

    # F19 (on face) → F20 (join)
    with BuildSketch(Plane.YZ.offset(231.952)):
        with Locations((2.5, 2.5)):
            Rectangle(F19_W, F19_H)
    extrude(amount=F20_DEPTH)


solid = Compound([f2.part, f3.part, f4.part])
